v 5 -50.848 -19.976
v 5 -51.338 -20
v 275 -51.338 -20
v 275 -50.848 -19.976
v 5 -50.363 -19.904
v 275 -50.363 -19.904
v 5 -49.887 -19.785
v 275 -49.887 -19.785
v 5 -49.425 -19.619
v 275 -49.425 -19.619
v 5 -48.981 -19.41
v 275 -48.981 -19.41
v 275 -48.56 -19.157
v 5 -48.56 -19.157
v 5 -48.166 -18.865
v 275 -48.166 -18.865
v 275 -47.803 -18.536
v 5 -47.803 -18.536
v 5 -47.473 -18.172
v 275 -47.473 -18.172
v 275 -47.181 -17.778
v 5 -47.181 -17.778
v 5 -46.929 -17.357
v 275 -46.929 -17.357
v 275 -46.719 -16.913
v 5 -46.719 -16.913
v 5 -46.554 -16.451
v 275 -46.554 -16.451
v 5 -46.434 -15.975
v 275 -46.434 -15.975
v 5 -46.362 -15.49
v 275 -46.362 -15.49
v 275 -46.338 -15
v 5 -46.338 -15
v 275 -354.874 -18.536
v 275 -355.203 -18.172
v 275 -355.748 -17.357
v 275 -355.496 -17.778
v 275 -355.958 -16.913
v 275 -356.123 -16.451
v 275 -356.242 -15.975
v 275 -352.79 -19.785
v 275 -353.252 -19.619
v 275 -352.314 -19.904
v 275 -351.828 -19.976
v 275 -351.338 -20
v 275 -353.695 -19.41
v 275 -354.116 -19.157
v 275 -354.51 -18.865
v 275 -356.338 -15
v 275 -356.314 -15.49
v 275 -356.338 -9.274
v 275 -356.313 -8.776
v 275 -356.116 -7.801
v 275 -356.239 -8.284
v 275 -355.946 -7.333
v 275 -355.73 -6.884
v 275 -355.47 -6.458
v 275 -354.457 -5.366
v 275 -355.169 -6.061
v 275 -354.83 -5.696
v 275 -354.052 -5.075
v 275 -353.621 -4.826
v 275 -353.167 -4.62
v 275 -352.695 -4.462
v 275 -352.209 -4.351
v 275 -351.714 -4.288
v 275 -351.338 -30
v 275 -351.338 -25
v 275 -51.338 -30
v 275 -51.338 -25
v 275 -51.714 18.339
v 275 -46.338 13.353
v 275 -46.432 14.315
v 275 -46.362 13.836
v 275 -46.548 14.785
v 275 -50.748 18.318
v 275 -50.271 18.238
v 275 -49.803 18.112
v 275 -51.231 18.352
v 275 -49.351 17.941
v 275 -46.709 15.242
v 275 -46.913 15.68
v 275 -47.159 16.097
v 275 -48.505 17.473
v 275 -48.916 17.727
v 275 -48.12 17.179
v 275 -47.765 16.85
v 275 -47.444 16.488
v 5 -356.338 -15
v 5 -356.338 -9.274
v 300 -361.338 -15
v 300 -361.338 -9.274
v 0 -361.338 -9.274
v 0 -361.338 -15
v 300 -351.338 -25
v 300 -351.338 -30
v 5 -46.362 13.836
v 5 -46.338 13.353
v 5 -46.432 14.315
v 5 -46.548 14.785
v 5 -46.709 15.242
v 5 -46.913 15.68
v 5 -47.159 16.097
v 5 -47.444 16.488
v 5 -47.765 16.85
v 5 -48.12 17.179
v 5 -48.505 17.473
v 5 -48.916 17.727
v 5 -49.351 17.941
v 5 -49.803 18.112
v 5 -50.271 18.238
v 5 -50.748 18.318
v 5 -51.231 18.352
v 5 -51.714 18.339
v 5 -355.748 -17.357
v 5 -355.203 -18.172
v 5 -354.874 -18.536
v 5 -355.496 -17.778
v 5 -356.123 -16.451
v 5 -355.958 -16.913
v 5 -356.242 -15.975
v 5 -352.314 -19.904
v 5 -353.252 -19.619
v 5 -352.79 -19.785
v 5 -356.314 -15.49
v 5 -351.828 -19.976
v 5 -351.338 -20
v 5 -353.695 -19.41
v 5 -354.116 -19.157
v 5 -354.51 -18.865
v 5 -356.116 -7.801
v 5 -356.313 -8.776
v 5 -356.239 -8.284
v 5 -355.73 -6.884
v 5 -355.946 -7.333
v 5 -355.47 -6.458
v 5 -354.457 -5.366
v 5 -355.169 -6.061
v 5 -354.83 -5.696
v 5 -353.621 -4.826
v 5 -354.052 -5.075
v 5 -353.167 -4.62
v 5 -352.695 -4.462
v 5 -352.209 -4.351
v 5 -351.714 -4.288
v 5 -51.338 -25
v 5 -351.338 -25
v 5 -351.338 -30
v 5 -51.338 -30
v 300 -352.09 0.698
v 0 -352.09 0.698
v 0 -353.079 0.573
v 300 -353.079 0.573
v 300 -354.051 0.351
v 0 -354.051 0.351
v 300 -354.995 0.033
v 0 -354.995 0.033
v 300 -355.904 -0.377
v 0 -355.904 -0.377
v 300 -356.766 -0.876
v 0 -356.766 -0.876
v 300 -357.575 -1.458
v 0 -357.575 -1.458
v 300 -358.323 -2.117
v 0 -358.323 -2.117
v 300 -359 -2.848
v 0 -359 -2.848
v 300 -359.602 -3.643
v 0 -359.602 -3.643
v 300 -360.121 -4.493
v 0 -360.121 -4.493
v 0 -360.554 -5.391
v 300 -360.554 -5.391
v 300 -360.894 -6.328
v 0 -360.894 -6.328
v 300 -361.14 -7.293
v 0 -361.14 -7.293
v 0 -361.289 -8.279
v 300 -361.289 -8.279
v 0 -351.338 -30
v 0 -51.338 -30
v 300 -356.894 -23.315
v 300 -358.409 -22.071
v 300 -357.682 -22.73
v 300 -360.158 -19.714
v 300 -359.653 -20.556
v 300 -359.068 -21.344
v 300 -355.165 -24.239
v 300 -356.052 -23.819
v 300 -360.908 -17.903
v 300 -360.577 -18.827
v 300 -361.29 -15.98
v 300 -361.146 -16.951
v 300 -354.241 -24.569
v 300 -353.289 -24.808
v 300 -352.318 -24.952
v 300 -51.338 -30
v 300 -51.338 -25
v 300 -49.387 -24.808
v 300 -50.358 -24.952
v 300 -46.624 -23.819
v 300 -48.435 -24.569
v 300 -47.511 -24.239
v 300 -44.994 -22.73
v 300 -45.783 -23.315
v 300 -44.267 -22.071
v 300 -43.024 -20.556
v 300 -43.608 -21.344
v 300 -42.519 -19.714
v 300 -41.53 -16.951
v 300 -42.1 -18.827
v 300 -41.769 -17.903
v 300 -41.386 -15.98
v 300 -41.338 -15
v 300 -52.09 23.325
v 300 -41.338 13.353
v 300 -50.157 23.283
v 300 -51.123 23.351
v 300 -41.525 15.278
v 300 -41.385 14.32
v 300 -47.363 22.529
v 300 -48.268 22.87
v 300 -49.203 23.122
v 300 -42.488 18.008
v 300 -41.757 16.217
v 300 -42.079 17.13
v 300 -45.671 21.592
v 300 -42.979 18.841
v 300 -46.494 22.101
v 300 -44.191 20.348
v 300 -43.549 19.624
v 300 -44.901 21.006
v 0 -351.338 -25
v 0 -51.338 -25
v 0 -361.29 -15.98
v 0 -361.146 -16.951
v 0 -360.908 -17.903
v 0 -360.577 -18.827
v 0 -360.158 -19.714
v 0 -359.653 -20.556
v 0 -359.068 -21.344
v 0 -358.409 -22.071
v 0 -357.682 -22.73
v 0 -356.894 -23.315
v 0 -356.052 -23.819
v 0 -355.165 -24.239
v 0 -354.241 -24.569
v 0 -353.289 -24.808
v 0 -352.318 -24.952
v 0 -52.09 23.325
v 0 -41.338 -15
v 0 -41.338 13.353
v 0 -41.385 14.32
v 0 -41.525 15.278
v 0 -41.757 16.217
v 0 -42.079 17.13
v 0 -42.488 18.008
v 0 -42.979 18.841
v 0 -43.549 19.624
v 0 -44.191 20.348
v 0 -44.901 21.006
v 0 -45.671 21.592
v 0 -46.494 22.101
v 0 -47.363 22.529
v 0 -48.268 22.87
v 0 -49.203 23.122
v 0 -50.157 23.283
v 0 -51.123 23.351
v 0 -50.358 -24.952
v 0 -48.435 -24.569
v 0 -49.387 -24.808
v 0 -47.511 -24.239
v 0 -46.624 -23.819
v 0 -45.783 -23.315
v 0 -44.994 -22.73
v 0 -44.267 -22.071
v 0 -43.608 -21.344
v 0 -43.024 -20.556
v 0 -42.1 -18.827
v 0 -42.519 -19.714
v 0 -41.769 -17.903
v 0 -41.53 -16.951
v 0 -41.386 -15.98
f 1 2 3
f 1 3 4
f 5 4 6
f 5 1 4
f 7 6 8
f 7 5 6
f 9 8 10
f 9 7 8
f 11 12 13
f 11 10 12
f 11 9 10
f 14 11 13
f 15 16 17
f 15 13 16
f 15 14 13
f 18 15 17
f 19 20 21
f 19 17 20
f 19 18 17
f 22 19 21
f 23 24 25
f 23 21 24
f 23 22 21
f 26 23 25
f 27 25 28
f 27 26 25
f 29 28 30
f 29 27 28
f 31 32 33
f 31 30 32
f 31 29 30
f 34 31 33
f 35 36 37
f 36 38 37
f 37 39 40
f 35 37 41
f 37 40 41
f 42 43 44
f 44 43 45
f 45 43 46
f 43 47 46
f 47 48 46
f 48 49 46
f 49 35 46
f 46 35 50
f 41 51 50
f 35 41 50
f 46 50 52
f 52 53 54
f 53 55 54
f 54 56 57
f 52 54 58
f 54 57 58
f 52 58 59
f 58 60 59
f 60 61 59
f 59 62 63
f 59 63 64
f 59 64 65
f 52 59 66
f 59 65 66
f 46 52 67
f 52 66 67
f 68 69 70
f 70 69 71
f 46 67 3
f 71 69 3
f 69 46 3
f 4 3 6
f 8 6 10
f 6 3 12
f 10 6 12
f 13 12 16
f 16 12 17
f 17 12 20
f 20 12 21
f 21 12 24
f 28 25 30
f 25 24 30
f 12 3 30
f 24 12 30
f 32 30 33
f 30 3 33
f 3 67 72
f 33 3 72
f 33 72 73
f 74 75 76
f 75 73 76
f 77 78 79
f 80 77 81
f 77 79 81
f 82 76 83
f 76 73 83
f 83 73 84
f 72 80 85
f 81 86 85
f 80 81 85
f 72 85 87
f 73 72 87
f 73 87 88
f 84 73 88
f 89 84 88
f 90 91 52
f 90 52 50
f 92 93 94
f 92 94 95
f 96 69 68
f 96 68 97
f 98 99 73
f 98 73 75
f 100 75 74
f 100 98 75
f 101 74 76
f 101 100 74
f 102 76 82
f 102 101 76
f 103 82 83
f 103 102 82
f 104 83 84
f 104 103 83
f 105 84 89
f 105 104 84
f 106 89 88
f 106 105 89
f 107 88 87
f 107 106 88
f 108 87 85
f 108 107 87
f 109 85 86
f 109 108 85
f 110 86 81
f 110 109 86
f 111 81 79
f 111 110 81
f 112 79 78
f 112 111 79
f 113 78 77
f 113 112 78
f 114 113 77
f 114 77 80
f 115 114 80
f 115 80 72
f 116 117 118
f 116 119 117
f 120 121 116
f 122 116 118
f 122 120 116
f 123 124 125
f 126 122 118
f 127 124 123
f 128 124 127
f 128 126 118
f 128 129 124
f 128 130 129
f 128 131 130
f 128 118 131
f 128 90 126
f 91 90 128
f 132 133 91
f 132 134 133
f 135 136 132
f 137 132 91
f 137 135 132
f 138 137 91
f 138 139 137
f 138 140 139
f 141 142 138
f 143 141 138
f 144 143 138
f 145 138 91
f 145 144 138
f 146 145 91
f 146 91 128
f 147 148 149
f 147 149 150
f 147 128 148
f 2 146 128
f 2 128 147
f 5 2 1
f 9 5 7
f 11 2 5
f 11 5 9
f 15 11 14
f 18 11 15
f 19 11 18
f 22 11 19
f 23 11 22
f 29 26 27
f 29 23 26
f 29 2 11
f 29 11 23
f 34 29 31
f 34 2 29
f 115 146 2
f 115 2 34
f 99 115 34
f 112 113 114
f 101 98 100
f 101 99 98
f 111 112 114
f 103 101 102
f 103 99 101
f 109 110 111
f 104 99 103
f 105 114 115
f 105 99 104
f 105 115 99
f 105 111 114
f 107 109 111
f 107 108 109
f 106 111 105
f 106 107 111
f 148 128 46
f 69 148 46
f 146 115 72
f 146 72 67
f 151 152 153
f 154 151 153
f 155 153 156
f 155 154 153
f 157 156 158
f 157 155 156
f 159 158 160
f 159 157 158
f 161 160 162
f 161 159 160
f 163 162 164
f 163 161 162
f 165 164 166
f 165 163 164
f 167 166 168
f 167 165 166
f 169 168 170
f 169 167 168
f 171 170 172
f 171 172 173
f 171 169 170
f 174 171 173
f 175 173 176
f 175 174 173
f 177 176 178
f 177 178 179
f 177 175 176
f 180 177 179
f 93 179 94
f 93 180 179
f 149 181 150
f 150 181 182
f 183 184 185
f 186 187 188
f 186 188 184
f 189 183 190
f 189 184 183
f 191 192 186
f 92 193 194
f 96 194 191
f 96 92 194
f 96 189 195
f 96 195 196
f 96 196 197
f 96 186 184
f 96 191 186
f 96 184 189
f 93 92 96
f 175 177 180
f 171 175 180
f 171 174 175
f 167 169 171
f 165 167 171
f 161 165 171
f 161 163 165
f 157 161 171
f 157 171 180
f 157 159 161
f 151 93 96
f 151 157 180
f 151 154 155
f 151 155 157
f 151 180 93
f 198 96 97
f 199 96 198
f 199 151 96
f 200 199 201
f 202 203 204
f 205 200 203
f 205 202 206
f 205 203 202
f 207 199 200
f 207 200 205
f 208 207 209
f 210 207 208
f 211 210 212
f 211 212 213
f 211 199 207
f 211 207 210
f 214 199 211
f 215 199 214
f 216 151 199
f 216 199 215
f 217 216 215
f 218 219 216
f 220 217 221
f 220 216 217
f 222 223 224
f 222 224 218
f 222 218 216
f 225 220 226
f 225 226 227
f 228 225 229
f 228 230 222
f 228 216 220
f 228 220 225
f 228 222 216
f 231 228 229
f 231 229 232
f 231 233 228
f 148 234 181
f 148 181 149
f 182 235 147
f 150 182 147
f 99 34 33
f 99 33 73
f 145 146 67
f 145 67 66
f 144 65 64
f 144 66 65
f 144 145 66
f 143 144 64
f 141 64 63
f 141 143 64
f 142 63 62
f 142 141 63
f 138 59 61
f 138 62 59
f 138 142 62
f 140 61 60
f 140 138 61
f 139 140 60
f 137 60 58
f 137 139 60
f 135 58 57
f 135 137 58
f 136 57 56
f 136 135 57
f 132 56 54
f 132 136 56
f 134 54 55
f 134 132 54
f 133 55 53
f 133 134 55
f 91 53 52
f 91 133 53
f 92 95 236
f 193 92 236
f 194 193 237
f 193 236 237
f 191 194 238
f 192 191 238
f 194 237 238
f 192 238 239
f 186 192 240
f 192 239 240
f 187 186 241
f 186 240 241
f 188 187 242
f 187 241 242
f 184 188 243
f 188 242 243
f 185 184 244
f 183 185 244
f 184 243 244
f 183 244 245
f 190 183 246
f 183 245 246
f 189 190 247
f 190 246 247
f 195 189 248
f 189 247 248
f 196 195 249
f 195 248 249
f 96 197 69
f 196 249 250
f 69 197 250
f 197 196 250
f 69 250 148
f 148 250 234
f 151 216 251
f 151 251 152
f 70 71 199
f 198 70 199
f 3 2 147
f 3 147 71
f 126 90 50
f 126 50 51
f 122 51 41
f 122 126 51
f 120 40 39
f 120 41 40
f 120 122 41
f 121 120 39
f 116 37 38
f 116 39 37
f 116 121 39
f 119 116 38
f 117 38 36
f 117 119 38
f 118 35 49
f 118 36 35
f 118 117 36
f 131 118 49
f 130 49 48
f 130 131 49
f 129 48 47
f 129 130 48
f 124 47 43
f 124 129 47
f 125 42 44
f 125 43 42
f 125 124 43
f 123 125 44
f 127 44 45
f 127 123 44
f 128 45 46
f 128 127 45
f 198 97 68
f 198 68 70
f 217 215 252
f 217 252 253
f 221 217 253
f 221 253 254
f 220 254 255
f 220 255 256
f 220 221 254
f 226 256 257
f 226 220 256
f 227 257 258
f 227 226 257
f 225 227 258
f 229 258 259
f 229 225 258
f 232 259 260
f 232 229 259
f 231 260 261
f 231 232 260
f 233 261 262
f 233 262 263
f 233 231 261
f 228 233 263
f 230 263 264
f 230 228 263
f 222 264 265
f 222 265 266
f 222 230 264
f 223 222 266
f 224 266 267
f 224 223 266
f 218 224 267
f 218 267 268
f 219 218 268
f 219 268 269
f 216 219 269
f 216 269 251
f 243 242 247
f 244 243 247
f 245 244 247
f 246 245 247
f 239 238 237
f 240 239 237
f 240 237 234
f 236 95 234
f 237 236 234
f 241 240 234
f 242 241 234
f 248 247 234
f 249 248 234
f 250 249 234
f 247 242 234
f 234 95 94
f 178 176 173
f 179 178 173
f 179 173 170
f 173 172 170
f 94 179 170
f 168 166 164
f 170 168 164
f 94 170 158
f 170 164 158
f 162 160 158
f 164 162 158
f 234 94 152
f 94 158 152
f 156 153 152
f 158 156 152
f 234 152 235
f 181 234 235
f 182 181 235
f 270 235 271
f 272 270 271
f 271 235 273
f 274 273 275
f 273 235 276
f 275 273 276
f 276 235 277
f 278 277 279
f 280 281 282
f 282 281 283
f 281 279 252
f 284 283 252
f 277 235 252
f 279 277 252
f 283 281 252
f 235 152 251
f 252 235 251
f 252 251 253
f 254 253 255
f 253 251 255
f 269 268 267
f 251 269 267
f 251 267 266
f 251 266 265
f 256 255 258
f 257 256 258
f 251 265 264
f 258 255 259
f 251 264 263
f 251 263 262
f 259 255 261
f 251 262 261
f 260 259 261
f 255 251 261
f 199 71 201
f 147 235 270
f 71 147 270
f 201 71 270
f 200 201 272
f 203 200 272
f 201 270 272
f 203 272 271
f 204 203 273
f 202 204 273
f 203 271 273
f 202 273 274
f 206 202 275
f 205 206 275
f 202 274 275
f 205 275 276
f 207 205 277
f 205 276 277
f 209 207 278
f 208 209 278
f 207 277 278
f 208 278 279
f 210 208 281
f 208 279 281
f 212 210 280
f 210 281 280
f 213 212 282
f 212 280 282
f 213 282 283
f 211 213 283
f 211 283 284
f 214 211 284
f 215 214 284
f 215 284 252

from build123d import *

# Parameters (mm, degrees)
F1_DEPTH = 300
F2_T     = -5
F4_DEPTH = 25
F7_DEPTH = 5
F9_DEPTH = 300


# Not quite as in the source:
# - a feature of the source that left no trace in its solid (it failed there, or was rolled back) is left out
# - a feature names something its author has since deleted; it is built from what else it names


with BuildPart() as f1:
    # F0 (on Right) → F1 (new body)
    with BuildSketch(Plane.YZ):
        with BuildLine():
            ThreePointArc((-361.3383226016, -15), (-358.4093904135, -22.0710678119), (-351.3383226016, -25))
            Line((-351.3383226016, -25), (-51.3383226016, -25))
            ThreePointArc((-51.3383226016, -25), (-44.2672547897, -22.0710678119), (-41.3383226016, -15))
            Line((-41.3383226016, -15), (-41.3383226016, 13.3530771738))
            ThreePointArc((-41.3383226016, 13.3530771738), (-44.538361228, 20.6852341086), (-52.0904276652, 23.3247539622))
            Line((-52.0904276652, 23.3247539622), (-352.0904276652, 0.6975144458))
            ThreePointArc((-352.0904276652, 0.6975144458), (-358.6704795365, -2.474200969), (-361.3383226016, -9.2741623426))
            Line((-361.3383226016, -9.2741623426), (-361.3383226016, -15))
        make_face()
    extrude(amount=F1_DEPTH)

    # F2: a shell. OpenCascade refuses it in one call, so the cavity is built on its own and cut out:
    # the body offset inwards by the wall thickness, plus a prism from it out through each open face.
    f2_core = offset(f1.part, amount=F2_T, mode=Mode.PRIVATE)
    f2_exits = [f2_core.faces().sort_by_distance(p)[0] for p in [
        (150, -201.338323, -20),
    ]]
    add(f2_core, mode=Mode.SUBTRACT)
    extrude(f2_exits, amount=-F2_T, mode=Mode.SUBTRACT)

    # F4 (add): a face of the model
    f4_faces = [f1.faces().sort_by_distance(p)[0] for p in [
        (300, -183.9481701293, -5.8146709921),
    ]]
    extrude(f4_faces, amount=-F4_DEPTH)

    # F7 (add): faces of the model
    f7_faces = [f1.faces().sort_by_distance(p)[0] for p in [
        (2.5, -201.3383226016, -25),
        (287.5, -201.3383226016, -25),
    ]]
    extrude(f7_faces, amount=F7_DEPTH)

    # F0 (on Right) → F9 (cut)
    with BuildSketch(Plane.YZ):
        with BuildLine():
            ThreePointArc((-361.3383226016, -15), (-358.4093904135, -22.0710678119), (-351.3383226016, -25))
            Line((-351.3383226016, -25), (-51.3383226016, -25))
            ThreePointArc((-51.3383226016, -25), (-44.2672547897, -22.0710678119), (-41.3383226016, -15))
            Line((-41.3383226016, -15), (-41.3383226016, 13.3530771738))
            ThreePointArc((-41.3383226016, 13.3530771738), (-44.538361228, 20.6852341086), (-52.0904276652, 23.3247539622))
            Line((-52.0904276652, 23.3247539622), (-352.0904276652, 0.6975144458))
            ThreePointArc((-352.0904276652, 0.6975144458), (-358.6704795365, -2.474200969), (-361.3383226016, -9.2741623426))
            Line((-361.3383226016, -9.2741623426), (-361.3383226016, -15))
        make_face()
    extrude(amount=-F9_DEPTH, mode=Mode.SUBTRACT)


solid = f1.part
